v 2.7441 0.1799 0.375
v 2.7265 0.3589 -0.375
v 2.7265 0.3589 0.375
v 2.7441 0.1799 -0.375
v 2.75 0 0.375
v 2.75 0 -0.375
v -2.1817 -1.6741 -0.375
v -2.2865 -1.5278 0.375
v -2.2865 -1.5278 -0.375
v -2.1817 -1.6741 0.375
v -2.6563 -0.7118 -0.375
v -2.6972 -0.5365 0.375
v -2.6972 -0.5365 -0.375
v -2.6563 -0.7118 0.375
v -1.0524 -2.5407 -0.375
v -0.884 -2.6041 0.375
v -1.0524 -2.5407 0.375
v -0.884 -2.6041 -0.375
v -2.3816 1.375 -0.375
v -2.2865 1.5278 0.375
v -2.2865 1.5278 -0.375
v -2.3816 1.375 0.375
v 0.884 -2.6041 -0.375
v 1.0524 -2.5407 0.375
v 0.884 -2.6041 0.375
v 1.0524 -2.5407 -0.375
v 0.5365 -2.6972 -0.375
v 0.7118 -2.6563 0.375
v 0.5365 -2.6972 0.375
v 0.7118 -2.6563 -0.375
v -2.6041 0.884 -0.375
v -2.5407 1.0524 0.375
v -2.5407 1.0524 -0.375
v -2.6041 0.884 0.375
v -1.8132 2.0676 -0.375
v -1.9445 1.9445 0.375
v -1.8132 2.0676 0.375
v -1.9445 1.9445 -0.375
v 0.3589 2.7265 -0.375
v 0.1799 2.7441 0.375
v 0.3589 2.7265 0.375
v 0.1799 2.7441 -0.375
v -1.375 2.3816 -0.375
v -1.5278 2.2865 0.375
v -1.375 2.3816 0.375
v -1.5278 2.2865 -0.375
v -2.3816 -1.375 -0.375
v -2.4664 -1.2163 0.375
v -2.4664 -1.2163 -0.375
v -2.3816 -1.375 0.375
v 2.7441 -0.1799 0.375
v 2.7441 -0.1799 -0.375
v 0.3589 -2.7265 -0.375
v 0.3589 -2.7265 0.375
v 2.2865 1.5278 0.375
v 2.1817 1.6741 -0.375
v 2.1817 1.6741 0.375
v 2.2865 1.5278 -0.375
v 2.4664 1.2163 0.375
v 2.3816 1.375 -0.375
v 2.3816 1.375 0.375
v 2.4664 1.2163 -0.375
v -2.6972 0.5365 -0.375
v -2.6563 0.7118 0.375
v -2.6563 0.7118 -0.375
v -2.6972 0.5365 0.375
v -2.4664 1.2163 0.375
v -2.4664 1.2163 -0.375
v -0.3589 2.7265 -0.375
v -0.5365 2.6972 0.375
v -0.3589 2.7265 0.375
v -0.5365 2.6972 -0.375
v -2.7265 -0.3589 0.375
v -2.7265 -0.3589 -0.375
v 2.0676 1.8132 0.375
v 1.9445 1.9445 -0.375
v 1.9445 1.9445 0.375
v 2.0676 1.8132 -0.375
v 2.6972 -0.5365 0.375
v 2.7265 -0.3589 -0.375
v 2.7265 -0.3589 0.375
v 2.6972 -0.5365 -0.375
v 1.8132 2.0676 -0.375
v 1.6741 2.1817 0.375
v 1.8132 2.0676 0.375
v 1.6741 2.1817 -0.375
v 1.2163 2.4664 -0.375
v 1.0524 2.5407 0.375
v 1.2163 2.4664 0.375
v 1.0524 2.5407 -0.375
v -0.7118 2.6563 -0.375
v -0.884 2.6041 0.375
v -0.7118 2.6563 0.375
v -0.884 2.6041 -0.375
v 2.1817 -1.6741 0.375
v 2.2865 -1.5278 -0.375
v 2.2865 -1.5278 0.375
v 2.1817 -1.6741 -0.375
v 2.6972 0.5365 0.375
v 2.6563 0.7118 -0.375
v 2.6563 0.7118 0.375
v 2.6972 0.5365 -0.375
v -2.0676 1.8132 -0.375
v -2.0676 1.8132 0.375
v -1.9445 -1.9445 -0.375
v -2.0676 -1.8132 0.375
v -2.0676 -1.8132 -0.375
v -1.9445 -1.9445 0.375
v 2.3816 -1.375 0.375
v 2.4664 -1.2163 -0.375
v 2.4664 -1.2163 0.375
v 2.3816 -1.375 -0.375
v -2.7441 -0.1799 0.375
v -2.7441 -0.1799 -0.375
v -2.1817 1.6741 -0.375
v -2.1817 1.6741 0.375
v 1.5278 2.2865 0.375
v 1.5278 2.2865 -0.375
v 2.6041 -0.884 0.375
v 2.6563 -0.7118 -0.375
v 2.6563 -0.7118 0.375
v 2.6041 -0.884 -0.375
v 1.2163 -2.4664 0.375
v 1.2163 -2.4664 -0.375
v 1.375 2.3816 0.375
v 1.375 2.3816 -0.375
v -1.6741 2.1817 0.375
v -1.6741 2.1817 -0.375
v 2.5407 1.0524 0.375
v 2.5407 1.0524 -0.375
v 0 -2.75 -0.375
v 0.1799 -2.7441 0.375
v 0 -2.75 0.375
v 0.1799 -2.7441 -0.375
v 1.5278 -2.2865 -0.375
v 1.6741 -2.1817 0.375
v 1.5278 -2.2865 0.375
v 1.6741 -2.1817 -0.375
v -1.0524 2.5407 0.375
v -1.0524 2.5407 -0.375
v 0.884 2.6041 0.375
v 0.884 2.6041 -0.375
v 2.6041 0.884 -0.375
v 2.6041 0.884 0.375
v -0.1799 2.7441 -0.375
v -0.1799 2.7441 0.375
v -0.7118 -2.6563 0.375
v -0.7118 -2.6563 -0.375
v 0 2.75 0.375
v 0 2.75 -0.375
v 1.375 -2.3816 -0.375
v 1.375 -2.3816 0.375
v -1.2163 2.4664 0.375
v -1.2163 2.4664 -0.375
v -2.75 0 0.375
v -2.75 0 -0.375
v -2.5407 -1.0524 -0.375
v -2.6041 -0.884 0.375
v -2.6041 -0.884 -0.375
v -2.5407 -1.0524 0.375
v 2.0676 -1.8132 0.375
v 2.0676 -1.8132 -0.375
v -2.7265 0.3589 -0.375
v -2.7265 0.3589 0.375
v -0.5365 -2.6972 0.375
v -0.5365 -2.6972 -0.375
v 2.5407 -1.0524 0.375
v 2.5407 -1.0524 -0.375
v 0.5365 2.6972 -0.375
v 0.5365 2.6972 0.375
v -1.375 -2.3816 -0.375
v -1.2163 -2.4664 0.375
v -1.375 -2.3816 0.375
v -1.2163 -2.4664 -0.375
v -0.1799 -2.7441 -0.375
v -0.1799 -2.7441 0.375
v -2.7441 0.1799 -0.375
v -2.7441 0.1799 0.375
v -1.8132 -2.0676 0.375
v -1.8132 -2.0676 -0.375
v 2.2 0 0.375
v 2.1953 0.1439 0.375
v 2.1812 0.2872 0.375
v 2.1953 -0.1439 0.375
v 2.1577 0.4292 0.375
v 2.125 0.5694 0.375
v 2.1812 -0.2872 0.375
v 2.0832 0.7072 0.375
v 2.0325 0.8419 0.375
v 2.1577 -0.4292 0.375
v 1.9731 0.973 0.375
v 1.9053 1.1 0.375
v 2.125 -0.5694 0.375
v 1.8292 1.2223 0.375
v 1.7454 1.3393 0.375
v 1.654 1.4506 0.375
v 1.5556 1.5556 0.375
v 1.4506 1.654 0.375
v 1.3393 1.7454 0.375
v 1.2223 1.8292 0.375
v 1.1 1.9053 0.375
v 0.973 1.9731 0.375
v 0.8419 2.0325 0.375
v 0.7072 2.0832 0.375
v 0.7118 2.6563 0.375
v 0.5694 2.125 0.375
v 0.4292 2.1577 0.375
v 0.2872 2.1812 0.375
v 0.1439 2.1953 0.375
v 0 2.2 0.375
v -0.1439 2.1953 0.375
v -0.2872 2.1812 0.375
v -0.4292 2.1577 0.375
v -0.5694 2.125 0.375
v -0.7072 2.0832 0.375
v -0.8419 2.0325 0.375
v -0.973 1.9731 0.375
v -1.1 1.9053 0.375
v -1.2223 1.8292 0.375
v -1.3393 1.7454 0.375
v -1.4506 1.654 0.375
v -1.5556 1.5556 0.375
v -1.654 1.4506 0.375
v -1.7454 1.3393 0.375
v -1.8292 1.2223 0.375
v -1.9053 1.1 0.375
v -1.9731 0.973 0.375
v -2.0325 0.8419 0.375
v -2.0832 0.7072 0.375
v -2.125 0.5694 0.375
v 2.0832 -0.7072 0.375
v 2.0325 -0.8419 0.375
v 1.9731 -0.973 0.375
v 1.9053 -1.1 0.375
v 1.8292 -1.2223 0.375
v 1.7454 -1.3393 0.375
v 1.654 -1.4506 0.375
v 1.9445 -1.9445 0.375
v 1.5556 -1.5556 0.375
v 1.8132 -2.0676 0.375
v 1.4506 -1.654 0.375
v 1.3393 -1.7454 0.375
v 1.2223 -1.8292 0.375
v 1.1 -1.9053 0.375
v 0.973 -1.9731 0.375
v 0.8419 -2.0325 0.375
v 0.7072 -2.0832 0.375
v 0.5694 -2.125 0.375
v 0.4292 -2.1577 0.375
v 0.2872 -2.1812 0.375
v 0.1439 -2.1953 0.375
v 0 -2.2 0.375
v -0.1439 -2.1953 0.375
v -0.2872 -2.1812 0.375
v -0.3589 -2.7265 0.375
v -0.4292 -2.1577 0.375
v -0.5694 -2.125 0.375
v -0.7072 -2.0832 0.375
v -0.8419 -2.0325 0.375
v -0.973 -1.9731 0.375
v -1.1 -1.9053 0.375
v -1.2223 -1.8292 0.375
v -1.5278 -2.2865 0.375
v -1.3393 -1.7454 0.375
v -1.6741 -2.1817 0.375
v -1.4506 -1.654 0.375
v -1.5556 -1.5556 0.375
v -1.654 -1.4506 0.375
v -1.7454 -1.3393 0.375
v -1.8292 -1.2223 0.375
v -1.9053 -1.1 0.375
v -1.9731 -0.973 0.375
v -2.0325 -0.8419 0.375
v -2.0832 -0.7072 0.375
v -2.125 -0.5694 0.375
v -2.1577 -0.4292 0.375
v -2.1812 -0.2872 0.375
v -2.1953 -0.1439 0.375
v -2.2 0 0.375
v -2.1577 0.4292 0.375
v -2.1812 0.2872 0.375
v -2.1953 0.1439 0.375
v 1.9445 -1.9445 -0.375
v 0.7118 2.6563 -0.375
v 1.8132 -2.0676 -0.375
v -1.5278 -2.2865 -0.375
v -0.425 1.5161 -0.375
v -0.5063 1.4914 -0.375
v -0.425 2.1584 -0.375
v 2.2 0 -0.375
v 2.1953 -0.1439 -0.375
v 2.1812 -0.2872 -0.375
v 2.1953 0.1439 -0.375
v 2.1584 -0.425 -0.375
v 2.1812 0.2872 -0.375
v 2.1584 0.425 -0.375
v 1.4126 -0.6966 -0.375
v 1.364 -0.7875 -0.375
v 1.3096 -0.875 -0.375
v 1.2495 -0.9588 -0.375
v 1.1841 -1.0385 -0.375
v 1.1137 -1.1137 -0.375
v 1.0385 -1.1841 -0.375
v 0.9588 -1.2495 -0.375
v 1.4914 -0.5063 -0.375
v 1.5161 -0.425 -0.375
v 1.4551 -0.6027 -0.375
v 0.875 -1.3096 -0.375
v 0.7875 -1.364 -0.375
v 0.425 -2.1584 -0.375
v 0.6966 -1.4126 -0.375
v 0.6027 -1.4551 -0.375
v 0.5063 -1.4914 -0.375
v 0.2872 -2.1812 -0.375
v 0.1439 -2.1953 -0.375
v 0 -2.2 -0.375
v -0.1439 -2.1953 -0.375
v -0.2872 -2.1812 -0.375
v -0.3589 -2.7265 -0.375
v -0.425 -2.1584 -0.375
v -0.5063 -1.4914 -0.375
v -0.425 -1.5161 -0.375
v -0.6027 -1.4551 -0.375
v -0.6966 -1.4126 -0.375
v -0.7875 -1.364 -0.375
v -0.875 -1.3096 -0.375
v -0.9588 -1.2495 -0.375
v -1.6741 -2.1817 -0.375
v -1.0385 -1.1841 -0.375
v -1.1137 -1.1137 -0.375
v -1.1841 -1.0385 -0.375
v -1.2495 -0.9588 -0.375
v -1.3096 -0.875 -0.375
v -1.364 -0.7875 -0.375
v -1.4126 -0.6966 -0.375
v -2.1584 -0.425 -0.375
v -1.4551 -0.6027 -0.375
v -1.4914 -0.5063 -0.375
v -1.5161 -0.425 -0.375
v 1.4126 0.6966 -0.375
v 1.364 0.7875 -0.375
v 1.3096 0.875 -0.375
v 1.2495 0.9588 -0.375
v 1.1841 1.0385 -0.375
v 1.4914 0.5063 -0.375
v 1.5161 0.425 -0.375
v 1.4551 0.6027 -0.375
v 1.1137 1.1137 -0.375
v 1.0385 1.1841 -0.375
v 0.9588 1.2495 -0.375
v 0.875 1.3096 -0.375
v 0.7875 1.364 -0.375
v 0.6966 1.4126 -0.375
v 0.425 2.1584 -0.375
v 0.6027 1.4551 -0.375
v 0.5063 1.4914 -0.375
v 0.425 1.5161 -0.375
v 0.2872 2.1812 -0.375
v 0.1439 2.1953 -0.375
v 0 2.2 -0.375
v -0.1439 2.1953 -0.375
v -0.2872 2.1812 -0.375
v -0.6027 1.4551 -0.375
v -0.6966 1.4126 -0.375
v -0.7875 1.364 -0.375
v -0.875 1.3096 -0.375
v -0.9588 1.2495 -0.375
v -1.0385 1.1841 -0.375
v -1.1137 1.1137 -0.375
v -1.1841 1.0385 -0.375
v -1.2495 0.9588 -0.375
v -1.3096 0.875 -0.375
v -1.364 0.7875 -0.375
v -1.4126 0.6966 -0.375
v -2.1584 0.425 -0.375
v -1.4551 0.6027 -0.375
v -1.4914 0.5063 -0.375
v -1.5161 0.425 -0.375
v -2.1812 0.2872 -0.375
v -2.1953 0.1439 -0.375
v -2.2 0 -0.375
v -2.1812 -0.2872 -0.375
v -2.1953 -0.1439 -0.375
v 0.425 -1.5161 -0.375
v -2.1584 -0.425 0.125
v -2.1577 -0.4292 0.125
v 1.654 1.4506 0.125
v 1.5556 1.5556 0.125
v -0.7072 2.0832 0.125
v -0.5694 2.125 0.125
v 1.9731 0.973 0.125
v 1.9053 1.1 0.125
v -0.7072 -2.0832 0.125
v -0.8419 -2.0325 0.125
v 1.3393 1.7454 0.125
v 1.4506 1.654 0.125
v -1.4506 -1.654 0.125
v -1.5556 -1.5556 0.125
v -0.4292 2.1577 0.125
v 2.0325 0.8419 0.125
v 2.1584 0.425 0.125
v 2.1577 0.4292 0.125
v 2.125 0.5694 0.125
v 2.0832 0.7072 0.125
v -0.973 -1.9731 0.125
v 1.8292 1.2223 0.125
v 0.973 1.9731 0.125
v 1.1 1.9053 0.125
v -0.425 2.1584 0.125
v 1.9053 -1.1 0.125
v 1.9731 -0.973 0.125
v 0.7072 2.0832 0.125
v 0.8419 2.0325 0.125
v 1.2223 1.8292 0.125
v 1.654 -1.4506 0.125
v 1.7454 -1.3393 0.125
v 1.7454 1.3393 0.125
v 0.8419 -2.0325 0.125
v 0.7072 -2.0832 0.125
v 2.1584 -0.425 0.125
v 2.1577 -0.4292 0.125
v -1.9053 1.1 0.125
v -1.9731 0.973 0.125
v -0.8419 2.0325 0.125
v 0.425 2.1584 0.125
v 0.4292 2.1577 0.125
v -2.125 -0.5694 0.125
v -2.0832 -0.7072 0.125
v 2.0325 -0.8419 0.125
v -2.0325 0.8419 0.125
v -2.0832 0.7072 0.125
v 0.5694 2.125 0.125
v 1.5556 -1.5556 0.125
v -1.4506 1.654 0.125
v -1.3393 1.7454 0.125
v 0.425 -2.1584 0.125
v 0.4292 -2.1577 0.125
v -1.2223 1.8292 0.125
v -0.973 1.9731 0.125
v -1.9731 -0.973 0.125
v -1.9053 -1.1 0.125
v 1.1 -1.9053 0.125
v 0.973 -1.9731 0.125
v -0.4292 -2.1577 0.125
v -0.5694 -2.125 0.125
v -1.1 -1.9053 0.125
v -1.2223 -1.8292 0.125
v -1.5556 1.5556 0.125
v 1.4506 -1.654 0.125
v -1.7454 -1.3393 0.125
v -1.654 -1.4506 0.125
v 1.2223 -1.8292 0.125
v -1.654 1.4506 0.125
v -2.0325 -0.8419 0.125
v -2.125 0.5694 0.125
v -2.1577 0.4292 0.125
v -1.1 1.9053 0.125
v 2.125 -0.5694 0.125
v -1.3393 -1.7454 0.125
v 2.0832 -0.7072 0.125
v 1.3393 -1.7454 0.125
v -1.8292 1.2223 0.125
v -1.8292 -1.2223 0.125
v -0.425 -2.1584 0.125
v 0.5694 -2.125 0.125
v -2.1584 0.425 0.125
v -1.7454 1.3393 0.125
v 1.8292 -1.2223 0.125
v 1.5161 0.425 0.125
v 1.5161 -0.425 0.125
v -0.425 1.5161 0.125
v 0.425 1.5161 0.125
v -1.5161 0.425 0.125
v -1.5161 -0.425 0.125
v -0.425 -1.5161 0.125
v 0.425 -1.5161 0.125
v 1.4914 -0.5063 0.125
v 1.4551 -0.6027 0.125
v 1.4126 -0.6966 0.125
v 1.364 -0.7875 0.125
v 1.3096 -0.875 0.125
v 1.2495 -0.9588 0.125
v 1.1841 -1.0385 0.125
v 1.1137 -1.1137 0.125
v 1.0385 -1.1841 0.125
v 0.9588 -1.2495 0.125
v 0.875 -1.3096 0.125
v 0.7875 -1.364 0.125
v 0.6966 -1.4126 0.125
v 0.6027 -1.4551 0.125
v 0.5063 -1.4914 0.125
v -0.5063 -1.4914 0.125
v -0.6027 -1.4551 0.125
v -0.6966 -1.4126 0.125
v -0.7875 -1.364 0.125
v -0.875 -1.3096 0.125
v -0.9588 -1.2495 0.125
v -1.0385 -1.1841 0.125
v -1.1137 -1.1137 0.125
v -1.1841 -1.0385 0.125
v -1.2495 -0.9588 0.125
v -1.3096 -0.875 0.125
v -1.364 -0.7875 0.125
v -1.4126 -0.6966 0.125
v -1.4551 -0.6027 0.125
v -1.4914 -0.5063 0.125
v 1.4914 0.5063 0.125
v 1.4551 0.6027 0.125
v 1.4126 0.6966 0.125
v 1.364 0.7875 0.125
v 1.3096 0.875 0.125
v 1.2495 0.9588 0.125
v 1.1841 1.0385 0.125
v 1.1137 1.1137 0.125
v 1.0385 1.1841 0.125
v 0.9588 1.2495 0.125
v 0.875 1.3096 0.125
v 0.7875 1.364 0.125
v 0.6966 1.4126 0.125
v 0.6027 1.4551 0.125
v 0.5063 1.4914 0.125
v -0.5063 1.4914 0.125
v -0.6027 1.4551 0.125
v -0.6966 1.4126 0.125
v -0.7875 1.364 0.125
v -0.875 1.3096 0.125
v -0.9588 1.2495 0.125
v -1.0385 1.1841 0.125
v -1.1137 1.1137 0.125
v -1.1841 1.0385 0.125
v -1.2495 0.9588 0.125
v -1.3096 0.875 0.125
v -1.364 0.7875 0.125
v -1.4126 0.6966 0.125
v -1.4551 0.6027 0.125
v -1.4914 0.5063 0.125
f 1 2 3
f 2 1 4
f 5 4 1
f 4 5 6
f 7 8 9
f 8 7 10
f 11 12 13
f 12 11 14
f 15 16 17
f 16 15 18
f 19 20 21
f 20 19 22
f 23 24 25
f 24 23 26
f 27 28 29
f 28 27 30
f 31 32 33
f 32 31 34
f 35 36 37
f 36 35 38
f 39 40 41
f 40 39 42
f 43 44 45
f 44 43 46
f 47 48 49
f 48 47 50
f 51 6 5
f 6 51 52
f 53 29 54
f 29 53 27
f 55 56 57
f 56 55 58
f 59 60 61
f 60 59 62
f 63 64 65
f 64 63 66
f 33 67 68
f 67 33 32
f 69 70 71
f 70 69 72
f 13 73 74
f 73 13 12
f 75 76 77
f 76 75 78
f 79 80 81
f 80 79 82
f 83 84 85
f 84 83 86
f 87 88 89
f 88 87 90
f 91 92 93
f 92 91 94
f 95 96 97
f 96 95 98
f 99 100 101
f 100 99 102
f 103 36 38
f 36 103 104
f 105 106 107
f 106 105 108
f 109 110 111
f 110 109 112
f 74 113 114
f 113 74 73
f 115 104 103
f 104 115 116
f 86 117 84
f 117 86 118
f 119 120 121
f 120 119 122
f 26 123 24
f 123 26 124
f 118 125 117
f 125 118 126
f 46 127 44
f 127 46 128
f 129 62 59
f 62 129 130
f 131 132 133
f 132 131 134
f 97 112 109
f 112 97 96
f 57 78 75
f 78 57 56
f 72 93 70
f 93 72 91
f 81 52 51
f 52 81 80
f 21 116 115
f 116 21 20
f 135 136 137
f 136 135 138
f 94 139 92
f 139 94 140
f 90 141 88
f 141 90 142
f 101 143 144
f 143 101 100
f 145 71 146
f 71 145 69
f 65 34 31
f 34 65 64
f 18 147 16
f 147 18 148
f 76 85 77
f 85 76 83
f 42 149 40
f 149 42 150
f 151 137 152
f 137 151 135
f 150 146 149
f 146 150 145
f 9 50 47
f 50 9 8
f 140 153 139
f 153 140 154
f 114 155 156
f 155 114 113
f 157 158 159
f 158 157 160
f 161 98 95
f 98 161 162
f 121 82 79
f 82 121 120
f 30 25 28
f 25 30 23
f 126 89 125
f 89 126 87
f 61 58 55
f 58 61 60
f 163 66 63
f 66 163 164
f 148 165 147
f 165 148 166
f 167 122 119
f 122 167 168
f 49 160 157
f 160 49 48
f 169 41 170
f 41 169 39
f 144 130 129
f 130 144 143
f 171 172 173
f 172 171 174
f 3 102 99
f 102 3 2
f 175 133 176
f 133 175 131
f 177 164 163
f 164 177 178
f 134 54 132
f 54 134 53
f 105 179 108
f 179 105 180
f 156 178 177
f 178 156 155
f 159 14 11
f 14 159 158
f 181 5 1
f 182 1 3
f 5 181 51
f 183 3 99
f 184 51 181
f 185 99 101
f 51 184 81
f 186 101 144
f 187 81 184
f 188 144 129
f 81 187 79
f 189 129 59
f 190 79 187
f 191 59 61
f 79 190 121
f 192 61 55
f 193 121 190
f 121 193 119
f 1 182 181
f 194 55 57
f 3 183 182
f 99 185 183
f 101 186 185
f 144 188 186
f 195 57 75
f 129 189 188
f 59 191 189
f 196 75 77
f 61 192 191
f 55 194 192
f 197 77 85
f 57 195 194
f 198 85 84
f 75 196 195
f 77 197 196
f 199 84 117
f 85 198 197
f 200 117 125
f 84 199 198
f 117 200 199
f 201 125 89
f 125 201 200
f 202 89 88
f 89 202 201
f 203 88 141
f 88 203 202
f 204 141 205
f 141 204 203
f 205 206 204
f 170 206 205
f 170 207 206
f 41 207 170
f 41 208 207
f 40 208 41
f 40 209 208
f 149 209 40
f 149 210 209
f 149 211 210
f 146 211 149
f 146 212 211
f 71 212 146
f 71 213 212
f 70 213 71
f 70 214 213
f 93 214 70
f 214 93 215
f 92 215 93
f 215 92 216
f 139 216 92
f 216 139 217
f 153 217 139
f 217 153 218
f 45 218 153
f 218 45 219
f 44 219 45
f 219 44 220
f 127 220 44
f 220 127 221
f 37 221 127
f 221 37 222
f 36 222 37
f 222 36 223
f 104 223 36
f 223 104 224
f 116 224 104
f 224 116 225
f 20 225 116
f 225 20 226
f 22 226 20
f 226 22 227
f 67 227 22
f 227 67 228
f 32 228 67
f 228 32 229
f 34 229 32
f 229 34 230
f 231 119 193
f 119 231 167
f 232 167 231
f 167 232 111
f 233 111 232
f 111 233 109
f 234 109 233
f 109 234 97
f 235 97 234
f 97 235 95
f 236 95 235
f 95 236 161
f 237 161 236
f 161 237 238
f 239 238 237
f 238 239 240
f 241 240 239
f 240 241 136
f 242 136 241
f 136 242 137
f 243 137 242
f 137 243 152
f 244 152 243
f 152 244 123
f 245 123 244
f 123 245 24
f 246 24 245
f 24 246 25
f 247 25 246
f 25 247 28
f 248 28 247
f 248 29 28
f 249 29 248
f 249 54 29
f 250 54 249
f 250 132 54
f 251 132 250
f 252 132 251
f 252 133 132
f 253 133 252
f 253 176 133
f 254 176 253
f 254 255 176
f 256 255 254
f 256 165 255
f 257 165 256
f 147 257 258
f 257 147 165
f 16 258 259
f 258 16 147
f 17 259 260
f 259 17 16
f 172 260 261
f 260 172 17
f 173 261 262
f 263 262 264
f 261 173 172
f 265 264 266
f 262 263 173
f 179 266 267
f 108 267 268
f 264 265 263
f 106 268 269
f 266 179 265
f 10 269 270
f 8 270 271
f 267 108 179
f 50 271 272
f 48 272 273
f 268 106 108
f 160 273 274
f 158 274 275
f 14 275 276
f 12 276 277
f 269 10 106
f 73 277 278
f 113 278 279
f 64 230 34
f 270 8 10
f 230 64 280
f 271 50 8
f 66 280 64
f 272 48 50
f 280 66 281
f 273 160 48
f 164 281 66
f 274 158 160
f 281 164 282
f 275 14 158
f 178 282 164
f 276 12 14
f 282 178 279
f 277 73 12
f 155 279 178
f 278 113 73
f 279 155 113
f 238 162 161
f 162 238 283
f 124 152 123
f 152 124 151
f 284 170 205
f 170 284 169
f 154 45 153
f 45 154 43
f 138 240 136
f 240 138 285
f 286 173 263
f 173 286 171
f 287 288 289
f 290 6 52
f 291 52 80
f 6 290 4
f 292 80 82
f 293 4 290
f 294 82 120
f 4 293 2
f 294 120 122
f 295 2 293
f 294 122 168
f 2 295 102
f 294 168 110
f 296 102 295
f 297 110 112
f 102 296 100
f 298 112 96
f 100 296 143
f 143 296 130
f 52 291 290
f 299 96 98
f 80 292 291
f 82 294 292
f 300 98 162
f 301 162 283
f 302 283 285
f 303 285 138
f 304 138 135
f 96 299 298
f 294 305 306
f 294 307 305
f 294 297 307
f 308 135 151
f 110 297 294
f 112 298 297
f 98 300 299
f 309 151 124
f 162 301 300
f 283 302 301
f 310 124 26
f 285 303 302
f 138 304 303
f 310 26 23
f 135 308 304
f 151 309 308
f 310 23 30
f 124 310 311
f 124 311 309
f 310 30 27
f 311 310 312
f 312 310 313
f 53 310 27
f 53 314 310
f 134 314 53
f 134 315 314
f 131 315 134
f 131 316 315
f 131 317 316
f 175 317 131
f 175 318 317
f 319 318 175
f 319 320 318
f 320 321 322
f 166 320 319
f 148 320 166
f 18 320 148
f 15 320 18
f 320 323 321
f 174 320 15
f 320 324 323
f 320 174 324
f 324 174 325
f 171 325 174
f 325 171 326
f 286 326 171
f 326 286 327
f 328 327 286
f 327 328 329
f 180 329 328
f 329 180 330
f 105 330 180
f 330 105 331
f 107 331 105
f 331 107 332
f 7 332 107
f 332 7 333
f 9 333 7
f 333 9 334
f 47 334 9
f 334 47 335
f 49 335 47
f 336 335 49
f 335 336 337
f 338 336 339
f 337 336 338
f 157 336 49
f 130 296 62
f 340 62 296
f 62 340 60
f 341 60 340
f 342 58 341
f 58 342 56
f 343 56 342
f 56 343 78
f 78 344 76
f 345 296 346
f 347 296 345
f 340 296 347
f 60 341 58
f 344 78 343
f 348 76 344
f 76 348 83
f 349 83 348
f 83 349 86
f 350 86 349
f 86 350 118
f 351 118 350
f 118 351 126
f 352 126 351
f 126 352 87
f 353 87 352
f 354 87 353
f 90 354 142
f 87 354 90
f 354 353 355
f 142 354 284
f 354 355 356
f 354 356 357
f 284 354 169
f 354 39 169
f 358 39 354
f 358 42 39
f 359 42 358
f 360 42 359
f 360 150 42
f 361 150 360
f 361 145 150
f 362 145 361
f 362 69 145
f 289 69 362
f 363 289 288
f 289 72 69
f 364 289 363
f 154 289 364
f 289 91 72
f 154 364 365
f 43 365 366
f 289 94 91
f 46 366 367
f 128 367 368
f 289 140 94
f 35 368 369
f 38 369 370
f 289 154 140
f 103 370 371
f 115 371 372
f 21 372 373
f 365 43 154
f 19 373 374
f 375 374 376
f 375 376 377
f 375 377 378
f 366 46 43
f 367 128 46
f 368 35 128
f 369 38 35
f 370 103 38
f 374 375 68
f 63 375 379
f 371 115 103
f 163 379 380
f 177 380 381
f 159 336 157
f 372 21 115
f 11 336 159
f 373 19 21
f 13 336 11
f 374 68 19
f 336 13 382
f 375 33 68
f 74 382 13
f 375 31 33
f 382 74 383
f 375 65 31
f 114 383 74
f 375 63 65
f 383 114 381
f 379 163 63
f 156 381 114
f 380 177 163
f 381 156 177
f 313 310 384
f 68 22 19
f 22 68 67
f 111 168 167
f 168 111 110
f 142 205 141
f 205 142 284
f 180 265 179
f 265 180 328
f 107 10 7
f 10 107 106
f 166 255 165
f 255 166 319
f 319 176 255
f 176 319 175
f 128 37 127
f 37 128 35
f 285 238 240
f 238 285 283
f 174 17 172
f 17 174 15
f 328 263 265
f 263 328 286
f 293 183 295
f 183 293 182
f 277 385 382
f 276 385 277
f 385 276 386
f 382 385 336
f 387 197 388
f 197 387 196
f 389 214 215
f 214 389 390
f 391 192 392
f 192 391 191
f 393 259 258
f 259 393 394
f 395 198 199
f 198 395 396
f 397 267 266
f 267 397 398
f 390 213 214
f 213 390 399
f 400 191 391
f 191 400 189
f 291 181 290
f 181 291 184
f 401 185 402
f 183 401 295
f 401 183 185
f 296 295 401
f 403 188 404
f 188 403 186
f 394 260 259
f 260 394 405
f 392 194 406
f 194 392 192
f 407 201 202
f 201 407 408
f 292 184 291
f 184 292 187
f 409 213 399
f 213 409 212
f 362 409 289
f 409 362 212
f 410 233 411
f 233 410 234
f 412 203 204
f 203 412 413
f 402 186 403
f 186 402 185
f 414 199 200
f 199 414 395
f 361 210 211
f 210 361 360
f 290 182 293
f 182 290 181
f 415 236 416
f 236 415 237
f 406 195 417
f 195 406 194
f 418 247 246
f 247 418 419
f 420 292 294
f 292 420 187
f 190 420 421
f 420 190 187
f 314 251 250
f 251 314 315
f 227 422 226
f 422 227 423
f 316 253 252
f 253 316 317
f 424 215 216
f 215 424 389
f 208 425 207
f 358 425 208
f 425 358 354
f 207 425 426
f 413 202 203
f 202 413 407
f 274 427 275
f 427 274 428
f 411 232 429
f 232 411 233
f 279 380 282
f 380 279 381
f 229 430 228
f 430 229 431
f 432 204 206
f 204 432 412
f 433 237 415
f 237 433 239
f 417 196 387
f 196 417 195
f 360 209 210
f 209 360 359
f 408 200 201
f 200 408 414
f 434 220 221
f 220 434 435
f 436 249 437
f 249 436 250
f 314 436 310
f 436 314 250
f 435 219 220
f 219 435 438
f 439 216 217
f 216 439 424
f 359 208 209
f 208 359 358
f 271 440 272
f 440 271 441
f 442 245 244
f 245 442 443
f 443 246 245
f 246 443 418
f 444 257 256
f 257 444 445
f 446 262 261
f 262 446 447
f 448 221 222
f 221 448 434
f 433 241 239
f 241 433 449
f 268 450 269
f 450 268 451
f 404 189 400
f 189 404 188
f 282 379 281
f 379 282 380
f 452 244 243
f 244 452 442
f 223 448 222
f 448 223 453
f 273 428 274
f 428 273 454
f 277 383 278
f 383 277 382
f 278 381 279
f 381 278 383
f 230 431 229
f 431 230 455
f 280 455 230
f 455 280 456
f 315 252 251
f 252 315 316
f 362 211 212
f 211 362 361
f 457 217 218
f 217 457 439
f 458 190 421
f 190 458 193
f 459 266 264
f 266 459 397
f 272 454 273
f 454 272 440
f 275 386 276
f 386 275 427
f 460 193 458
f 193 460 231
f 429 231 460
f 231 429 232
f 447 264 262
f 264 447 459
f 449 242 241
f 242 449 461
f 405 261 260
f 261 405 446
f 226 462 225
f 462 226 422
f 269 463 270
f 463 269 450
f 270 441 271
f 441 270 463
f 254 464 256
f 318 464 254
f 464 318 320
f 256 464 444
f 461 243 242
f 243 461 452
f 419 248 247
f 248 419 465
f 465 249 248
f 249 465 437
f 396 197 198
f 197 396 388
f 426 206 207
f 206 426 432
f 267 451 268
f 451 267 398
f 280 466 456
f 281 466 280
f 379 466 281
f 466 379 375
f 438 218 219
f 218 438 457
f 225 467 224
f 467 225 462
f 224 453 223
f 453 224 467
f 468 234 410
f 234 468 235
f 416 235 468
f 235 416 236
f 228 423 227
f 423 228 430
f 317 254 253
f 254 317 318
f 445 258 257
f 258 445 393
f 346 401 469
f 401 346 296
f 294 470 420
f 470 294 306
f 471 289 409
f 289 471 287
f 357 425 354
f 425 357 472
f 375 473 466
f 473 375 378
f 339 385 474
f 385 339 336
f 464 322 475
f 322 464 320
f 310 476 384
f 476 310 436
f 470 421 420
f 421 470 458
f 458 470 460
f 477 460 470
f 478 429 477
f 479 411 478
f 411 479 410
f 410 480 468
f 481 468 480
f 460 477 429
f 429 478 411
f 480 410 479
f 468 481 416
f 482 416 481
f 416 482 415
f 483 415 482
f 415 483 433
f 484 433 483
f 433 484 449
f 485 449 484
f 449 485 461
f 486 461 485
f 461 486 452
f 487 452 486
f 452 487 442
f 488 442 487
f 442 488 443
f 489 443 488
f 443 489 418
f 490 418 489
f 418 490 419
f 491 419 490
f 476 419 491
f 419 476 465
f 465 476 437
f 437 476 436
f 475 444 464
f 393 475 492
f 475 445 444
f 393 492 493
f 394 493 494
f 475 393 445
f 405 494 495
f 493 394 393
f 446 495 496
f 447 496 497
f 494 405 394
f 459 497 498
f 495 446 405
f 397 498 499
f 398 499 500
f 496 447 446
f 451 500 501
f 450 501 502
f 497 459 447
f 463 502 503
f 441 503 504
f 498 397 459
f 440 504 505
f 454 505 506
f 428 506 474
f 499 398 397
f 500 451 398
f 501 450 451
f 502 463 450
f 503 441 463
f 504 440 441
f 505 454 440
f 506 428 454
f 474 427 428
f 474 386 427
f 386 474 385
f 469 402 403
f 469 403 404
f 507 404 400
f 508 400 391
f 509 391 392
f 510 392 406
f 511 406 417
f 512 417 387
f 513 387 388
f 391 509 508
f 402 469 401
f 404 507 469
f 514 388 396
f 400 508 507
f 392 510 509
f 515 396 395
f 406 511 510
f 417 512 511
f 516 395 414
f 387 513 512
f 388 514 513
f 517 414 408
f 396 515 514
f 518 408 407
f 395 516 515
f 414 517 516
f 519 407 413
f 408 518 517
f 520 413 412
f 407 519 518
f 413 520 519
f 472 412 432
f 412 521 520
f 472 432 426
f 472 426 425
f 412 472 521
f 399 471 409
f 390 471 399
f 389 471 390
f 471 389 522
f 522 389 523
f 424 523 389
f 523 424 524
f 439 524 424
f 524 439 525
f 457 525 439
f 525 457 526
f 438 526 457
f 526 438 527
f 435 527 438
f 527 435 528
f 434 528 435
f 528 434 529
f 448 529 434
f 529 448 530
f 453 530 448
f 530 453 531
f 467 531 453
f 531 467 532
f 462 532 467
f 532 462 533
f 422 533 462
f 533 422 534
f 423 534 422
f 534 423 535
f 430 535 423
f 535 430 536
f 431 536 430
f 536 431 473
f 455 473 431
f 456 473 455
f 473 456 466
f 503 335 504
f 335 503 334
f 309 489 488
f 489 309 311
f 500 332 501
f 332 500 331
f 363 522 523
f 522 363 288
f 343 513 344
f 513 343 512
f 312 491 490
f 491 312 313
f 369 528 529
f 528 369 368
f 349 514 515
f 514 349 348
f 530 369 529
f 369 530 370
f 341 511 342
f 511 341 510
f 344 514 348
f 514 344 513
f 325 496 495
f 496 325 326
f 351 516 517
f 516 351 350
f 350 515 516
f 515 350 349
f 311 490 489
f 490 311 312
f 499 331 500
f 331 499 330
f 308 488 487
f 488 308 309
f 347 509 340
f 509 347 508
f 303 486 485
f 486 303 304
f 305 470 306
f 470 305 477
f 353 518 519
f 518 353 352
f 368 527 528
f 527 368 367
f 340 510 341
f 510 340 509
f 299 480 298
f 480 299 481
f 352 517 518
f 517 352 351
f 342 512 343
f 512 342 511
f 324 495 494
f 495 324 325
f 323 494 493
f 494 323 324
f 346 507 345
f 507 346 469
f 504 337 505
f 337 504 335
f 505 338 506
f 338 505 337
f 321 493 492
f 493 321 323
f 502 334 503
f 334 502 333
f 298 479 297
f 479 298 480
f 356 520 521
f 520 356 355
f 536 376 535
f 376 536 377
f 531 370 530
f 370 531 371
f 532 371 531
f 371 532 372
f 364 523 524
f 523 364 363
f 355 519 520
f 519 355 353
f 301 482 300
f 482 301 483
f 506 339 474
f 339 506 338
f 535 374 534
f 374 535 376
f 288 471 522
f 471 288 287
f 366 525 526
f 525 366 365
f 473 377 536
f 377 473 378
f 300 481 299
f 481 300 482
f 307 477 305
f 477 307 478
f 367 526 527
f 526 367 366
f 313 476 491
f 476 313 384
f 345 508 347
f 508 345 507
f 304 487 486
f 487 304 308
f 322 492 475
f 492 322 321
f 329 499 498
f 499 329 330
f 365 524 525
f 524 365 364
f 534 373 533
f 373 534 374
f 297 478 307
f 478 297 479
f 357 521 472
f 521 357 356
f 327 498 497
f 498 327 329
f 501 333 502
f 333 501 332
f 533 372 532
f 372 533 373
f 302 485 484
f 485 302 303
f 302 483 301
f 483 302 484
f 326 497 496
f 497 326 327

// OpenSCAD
// --- TEKTONOLOGY BOLT RETAINER ---
// Push-on anti-loss clip for M3×0.5 socket-head cap screws (Prayer Sole cap).
// Rigid outer ring seats against the cap wall; four flex prongs extend inward
// from the ring bore and grip the shank (outlet-cover screw-retainer style).
//
// Print flat (XY), 0.2 mm layers; PETG or nylon recommended for flex/fatigue.

// --- M3 thread envelope ---
thread_major = 3.0;   // M3 nominal major diameter (mm)
thread_pitch = 0.5;

// --- Outer seating ring (keep in sync with washer_ring_od in config.scad) ---
ring_od      = 5.5;   // seats on cap boss / wall (cf. commercial panel retainer ≈ 4.3)
ring_id      = 4.4;   // inner bore — prongs root on this wall
ring_height  = 0.75;  // rigid seat flange (Z)

// --- Flex prongs (fused to ring inner wall) ---
prong_height = 0.5;  // thin grip only — cf. stamped panel retainers ≈ 0.4 mm
grip_dia     = 2.65;  // engaged ID — slightly under major Ø for thread bite
entry_dia    = 3.15;  // lead-in at prong tips (screw spreads prongs on install)
prong_count  = 4;
slot_width   = 0.85;  // gap between prongs (mm) — narrower for four fingers
// Prongs at cap-facing / seat side of ring
prong_z      = -(ring_height / 2) + (prong_height / 2);

// --- Optional batch layout for printing ---
print_qty = 1;        // set >1 to lay out a small plate
print_pitch = ring_od + 1.5;

// --- Mesh quality ---
preview = false;
$fn = preview ? 32 : 96;

// =====================================================================
// RETAINER BODY
// =====================================================================

module outer_ring() {
  difference() {
    cylinder(d=ring_od, h=ring_height, center=true);
    cylinder(d=ring_id, h=ring_height + 0.02, center=true);
  }
}

// Four prongs cut from a disk fused to the ring OD/ID wall at prong_z.
module flex_prongs() {
  r_o = ring_od / 2;
  entry_r = entry_dia / 2;

  translate([0, 0, prong_z])
  difference() {
    // One piece with outer ring wall — roots on ring_id bore
    cylinder(d=ring_od, h=prong_height, center=true);

    // Lead-in bore at prong tips
    cylinder(d=entry_dia, h=prong_height + 0.02, center=true);

    // Radial slots → four prongs attached at the outer ring
    for (i = [0 : prong_count - 1]) {
      rotate([0, 0, i * (360 / prong_count)])
        translate([(entry_r + r_o) / 2, 0, 0])
          cube([r_o - entry_r + 0.2, slot_width, prong_height + 0.02], center=true);
    }
  }
}

module bolt_retainer() {
  union() {
    outer_ring();
    flex_prongs();
  }
}

module bolt_retainer_plate(qty = print_qty) {
  if (qty <= 1) {
    bolt_retainer();
  } else {
    for (i = [0 : qty - 1])
      translate([i * print_pitch, 0, 0])
        bolt_retainer();
  }
}

// =====================================================================
// DEBUG — M3 shank for fit check (comment out for STL export)
// =====================================================================

module debug_m3_shank(len = 12) {
  color("silver", 0.55)
    union() {
      translate([0, 0, ring_height / 2 + 0.01])
        cylinder(d=thread_major, h=len);
      translate([0, 0, ring_height / 2 + len + 1.75])
        cylinder(d=5.5, h=3.5, $fn=6); // rough socket-head stand-in
    }
}

// =====================================================================
// RENDERING
// =====================================================================

bolt_retainer_plate();

// Uncomment to preview retainer seated on shank:
// %translate([0, 0, ring_height / 2]) debug_m3_shank();
